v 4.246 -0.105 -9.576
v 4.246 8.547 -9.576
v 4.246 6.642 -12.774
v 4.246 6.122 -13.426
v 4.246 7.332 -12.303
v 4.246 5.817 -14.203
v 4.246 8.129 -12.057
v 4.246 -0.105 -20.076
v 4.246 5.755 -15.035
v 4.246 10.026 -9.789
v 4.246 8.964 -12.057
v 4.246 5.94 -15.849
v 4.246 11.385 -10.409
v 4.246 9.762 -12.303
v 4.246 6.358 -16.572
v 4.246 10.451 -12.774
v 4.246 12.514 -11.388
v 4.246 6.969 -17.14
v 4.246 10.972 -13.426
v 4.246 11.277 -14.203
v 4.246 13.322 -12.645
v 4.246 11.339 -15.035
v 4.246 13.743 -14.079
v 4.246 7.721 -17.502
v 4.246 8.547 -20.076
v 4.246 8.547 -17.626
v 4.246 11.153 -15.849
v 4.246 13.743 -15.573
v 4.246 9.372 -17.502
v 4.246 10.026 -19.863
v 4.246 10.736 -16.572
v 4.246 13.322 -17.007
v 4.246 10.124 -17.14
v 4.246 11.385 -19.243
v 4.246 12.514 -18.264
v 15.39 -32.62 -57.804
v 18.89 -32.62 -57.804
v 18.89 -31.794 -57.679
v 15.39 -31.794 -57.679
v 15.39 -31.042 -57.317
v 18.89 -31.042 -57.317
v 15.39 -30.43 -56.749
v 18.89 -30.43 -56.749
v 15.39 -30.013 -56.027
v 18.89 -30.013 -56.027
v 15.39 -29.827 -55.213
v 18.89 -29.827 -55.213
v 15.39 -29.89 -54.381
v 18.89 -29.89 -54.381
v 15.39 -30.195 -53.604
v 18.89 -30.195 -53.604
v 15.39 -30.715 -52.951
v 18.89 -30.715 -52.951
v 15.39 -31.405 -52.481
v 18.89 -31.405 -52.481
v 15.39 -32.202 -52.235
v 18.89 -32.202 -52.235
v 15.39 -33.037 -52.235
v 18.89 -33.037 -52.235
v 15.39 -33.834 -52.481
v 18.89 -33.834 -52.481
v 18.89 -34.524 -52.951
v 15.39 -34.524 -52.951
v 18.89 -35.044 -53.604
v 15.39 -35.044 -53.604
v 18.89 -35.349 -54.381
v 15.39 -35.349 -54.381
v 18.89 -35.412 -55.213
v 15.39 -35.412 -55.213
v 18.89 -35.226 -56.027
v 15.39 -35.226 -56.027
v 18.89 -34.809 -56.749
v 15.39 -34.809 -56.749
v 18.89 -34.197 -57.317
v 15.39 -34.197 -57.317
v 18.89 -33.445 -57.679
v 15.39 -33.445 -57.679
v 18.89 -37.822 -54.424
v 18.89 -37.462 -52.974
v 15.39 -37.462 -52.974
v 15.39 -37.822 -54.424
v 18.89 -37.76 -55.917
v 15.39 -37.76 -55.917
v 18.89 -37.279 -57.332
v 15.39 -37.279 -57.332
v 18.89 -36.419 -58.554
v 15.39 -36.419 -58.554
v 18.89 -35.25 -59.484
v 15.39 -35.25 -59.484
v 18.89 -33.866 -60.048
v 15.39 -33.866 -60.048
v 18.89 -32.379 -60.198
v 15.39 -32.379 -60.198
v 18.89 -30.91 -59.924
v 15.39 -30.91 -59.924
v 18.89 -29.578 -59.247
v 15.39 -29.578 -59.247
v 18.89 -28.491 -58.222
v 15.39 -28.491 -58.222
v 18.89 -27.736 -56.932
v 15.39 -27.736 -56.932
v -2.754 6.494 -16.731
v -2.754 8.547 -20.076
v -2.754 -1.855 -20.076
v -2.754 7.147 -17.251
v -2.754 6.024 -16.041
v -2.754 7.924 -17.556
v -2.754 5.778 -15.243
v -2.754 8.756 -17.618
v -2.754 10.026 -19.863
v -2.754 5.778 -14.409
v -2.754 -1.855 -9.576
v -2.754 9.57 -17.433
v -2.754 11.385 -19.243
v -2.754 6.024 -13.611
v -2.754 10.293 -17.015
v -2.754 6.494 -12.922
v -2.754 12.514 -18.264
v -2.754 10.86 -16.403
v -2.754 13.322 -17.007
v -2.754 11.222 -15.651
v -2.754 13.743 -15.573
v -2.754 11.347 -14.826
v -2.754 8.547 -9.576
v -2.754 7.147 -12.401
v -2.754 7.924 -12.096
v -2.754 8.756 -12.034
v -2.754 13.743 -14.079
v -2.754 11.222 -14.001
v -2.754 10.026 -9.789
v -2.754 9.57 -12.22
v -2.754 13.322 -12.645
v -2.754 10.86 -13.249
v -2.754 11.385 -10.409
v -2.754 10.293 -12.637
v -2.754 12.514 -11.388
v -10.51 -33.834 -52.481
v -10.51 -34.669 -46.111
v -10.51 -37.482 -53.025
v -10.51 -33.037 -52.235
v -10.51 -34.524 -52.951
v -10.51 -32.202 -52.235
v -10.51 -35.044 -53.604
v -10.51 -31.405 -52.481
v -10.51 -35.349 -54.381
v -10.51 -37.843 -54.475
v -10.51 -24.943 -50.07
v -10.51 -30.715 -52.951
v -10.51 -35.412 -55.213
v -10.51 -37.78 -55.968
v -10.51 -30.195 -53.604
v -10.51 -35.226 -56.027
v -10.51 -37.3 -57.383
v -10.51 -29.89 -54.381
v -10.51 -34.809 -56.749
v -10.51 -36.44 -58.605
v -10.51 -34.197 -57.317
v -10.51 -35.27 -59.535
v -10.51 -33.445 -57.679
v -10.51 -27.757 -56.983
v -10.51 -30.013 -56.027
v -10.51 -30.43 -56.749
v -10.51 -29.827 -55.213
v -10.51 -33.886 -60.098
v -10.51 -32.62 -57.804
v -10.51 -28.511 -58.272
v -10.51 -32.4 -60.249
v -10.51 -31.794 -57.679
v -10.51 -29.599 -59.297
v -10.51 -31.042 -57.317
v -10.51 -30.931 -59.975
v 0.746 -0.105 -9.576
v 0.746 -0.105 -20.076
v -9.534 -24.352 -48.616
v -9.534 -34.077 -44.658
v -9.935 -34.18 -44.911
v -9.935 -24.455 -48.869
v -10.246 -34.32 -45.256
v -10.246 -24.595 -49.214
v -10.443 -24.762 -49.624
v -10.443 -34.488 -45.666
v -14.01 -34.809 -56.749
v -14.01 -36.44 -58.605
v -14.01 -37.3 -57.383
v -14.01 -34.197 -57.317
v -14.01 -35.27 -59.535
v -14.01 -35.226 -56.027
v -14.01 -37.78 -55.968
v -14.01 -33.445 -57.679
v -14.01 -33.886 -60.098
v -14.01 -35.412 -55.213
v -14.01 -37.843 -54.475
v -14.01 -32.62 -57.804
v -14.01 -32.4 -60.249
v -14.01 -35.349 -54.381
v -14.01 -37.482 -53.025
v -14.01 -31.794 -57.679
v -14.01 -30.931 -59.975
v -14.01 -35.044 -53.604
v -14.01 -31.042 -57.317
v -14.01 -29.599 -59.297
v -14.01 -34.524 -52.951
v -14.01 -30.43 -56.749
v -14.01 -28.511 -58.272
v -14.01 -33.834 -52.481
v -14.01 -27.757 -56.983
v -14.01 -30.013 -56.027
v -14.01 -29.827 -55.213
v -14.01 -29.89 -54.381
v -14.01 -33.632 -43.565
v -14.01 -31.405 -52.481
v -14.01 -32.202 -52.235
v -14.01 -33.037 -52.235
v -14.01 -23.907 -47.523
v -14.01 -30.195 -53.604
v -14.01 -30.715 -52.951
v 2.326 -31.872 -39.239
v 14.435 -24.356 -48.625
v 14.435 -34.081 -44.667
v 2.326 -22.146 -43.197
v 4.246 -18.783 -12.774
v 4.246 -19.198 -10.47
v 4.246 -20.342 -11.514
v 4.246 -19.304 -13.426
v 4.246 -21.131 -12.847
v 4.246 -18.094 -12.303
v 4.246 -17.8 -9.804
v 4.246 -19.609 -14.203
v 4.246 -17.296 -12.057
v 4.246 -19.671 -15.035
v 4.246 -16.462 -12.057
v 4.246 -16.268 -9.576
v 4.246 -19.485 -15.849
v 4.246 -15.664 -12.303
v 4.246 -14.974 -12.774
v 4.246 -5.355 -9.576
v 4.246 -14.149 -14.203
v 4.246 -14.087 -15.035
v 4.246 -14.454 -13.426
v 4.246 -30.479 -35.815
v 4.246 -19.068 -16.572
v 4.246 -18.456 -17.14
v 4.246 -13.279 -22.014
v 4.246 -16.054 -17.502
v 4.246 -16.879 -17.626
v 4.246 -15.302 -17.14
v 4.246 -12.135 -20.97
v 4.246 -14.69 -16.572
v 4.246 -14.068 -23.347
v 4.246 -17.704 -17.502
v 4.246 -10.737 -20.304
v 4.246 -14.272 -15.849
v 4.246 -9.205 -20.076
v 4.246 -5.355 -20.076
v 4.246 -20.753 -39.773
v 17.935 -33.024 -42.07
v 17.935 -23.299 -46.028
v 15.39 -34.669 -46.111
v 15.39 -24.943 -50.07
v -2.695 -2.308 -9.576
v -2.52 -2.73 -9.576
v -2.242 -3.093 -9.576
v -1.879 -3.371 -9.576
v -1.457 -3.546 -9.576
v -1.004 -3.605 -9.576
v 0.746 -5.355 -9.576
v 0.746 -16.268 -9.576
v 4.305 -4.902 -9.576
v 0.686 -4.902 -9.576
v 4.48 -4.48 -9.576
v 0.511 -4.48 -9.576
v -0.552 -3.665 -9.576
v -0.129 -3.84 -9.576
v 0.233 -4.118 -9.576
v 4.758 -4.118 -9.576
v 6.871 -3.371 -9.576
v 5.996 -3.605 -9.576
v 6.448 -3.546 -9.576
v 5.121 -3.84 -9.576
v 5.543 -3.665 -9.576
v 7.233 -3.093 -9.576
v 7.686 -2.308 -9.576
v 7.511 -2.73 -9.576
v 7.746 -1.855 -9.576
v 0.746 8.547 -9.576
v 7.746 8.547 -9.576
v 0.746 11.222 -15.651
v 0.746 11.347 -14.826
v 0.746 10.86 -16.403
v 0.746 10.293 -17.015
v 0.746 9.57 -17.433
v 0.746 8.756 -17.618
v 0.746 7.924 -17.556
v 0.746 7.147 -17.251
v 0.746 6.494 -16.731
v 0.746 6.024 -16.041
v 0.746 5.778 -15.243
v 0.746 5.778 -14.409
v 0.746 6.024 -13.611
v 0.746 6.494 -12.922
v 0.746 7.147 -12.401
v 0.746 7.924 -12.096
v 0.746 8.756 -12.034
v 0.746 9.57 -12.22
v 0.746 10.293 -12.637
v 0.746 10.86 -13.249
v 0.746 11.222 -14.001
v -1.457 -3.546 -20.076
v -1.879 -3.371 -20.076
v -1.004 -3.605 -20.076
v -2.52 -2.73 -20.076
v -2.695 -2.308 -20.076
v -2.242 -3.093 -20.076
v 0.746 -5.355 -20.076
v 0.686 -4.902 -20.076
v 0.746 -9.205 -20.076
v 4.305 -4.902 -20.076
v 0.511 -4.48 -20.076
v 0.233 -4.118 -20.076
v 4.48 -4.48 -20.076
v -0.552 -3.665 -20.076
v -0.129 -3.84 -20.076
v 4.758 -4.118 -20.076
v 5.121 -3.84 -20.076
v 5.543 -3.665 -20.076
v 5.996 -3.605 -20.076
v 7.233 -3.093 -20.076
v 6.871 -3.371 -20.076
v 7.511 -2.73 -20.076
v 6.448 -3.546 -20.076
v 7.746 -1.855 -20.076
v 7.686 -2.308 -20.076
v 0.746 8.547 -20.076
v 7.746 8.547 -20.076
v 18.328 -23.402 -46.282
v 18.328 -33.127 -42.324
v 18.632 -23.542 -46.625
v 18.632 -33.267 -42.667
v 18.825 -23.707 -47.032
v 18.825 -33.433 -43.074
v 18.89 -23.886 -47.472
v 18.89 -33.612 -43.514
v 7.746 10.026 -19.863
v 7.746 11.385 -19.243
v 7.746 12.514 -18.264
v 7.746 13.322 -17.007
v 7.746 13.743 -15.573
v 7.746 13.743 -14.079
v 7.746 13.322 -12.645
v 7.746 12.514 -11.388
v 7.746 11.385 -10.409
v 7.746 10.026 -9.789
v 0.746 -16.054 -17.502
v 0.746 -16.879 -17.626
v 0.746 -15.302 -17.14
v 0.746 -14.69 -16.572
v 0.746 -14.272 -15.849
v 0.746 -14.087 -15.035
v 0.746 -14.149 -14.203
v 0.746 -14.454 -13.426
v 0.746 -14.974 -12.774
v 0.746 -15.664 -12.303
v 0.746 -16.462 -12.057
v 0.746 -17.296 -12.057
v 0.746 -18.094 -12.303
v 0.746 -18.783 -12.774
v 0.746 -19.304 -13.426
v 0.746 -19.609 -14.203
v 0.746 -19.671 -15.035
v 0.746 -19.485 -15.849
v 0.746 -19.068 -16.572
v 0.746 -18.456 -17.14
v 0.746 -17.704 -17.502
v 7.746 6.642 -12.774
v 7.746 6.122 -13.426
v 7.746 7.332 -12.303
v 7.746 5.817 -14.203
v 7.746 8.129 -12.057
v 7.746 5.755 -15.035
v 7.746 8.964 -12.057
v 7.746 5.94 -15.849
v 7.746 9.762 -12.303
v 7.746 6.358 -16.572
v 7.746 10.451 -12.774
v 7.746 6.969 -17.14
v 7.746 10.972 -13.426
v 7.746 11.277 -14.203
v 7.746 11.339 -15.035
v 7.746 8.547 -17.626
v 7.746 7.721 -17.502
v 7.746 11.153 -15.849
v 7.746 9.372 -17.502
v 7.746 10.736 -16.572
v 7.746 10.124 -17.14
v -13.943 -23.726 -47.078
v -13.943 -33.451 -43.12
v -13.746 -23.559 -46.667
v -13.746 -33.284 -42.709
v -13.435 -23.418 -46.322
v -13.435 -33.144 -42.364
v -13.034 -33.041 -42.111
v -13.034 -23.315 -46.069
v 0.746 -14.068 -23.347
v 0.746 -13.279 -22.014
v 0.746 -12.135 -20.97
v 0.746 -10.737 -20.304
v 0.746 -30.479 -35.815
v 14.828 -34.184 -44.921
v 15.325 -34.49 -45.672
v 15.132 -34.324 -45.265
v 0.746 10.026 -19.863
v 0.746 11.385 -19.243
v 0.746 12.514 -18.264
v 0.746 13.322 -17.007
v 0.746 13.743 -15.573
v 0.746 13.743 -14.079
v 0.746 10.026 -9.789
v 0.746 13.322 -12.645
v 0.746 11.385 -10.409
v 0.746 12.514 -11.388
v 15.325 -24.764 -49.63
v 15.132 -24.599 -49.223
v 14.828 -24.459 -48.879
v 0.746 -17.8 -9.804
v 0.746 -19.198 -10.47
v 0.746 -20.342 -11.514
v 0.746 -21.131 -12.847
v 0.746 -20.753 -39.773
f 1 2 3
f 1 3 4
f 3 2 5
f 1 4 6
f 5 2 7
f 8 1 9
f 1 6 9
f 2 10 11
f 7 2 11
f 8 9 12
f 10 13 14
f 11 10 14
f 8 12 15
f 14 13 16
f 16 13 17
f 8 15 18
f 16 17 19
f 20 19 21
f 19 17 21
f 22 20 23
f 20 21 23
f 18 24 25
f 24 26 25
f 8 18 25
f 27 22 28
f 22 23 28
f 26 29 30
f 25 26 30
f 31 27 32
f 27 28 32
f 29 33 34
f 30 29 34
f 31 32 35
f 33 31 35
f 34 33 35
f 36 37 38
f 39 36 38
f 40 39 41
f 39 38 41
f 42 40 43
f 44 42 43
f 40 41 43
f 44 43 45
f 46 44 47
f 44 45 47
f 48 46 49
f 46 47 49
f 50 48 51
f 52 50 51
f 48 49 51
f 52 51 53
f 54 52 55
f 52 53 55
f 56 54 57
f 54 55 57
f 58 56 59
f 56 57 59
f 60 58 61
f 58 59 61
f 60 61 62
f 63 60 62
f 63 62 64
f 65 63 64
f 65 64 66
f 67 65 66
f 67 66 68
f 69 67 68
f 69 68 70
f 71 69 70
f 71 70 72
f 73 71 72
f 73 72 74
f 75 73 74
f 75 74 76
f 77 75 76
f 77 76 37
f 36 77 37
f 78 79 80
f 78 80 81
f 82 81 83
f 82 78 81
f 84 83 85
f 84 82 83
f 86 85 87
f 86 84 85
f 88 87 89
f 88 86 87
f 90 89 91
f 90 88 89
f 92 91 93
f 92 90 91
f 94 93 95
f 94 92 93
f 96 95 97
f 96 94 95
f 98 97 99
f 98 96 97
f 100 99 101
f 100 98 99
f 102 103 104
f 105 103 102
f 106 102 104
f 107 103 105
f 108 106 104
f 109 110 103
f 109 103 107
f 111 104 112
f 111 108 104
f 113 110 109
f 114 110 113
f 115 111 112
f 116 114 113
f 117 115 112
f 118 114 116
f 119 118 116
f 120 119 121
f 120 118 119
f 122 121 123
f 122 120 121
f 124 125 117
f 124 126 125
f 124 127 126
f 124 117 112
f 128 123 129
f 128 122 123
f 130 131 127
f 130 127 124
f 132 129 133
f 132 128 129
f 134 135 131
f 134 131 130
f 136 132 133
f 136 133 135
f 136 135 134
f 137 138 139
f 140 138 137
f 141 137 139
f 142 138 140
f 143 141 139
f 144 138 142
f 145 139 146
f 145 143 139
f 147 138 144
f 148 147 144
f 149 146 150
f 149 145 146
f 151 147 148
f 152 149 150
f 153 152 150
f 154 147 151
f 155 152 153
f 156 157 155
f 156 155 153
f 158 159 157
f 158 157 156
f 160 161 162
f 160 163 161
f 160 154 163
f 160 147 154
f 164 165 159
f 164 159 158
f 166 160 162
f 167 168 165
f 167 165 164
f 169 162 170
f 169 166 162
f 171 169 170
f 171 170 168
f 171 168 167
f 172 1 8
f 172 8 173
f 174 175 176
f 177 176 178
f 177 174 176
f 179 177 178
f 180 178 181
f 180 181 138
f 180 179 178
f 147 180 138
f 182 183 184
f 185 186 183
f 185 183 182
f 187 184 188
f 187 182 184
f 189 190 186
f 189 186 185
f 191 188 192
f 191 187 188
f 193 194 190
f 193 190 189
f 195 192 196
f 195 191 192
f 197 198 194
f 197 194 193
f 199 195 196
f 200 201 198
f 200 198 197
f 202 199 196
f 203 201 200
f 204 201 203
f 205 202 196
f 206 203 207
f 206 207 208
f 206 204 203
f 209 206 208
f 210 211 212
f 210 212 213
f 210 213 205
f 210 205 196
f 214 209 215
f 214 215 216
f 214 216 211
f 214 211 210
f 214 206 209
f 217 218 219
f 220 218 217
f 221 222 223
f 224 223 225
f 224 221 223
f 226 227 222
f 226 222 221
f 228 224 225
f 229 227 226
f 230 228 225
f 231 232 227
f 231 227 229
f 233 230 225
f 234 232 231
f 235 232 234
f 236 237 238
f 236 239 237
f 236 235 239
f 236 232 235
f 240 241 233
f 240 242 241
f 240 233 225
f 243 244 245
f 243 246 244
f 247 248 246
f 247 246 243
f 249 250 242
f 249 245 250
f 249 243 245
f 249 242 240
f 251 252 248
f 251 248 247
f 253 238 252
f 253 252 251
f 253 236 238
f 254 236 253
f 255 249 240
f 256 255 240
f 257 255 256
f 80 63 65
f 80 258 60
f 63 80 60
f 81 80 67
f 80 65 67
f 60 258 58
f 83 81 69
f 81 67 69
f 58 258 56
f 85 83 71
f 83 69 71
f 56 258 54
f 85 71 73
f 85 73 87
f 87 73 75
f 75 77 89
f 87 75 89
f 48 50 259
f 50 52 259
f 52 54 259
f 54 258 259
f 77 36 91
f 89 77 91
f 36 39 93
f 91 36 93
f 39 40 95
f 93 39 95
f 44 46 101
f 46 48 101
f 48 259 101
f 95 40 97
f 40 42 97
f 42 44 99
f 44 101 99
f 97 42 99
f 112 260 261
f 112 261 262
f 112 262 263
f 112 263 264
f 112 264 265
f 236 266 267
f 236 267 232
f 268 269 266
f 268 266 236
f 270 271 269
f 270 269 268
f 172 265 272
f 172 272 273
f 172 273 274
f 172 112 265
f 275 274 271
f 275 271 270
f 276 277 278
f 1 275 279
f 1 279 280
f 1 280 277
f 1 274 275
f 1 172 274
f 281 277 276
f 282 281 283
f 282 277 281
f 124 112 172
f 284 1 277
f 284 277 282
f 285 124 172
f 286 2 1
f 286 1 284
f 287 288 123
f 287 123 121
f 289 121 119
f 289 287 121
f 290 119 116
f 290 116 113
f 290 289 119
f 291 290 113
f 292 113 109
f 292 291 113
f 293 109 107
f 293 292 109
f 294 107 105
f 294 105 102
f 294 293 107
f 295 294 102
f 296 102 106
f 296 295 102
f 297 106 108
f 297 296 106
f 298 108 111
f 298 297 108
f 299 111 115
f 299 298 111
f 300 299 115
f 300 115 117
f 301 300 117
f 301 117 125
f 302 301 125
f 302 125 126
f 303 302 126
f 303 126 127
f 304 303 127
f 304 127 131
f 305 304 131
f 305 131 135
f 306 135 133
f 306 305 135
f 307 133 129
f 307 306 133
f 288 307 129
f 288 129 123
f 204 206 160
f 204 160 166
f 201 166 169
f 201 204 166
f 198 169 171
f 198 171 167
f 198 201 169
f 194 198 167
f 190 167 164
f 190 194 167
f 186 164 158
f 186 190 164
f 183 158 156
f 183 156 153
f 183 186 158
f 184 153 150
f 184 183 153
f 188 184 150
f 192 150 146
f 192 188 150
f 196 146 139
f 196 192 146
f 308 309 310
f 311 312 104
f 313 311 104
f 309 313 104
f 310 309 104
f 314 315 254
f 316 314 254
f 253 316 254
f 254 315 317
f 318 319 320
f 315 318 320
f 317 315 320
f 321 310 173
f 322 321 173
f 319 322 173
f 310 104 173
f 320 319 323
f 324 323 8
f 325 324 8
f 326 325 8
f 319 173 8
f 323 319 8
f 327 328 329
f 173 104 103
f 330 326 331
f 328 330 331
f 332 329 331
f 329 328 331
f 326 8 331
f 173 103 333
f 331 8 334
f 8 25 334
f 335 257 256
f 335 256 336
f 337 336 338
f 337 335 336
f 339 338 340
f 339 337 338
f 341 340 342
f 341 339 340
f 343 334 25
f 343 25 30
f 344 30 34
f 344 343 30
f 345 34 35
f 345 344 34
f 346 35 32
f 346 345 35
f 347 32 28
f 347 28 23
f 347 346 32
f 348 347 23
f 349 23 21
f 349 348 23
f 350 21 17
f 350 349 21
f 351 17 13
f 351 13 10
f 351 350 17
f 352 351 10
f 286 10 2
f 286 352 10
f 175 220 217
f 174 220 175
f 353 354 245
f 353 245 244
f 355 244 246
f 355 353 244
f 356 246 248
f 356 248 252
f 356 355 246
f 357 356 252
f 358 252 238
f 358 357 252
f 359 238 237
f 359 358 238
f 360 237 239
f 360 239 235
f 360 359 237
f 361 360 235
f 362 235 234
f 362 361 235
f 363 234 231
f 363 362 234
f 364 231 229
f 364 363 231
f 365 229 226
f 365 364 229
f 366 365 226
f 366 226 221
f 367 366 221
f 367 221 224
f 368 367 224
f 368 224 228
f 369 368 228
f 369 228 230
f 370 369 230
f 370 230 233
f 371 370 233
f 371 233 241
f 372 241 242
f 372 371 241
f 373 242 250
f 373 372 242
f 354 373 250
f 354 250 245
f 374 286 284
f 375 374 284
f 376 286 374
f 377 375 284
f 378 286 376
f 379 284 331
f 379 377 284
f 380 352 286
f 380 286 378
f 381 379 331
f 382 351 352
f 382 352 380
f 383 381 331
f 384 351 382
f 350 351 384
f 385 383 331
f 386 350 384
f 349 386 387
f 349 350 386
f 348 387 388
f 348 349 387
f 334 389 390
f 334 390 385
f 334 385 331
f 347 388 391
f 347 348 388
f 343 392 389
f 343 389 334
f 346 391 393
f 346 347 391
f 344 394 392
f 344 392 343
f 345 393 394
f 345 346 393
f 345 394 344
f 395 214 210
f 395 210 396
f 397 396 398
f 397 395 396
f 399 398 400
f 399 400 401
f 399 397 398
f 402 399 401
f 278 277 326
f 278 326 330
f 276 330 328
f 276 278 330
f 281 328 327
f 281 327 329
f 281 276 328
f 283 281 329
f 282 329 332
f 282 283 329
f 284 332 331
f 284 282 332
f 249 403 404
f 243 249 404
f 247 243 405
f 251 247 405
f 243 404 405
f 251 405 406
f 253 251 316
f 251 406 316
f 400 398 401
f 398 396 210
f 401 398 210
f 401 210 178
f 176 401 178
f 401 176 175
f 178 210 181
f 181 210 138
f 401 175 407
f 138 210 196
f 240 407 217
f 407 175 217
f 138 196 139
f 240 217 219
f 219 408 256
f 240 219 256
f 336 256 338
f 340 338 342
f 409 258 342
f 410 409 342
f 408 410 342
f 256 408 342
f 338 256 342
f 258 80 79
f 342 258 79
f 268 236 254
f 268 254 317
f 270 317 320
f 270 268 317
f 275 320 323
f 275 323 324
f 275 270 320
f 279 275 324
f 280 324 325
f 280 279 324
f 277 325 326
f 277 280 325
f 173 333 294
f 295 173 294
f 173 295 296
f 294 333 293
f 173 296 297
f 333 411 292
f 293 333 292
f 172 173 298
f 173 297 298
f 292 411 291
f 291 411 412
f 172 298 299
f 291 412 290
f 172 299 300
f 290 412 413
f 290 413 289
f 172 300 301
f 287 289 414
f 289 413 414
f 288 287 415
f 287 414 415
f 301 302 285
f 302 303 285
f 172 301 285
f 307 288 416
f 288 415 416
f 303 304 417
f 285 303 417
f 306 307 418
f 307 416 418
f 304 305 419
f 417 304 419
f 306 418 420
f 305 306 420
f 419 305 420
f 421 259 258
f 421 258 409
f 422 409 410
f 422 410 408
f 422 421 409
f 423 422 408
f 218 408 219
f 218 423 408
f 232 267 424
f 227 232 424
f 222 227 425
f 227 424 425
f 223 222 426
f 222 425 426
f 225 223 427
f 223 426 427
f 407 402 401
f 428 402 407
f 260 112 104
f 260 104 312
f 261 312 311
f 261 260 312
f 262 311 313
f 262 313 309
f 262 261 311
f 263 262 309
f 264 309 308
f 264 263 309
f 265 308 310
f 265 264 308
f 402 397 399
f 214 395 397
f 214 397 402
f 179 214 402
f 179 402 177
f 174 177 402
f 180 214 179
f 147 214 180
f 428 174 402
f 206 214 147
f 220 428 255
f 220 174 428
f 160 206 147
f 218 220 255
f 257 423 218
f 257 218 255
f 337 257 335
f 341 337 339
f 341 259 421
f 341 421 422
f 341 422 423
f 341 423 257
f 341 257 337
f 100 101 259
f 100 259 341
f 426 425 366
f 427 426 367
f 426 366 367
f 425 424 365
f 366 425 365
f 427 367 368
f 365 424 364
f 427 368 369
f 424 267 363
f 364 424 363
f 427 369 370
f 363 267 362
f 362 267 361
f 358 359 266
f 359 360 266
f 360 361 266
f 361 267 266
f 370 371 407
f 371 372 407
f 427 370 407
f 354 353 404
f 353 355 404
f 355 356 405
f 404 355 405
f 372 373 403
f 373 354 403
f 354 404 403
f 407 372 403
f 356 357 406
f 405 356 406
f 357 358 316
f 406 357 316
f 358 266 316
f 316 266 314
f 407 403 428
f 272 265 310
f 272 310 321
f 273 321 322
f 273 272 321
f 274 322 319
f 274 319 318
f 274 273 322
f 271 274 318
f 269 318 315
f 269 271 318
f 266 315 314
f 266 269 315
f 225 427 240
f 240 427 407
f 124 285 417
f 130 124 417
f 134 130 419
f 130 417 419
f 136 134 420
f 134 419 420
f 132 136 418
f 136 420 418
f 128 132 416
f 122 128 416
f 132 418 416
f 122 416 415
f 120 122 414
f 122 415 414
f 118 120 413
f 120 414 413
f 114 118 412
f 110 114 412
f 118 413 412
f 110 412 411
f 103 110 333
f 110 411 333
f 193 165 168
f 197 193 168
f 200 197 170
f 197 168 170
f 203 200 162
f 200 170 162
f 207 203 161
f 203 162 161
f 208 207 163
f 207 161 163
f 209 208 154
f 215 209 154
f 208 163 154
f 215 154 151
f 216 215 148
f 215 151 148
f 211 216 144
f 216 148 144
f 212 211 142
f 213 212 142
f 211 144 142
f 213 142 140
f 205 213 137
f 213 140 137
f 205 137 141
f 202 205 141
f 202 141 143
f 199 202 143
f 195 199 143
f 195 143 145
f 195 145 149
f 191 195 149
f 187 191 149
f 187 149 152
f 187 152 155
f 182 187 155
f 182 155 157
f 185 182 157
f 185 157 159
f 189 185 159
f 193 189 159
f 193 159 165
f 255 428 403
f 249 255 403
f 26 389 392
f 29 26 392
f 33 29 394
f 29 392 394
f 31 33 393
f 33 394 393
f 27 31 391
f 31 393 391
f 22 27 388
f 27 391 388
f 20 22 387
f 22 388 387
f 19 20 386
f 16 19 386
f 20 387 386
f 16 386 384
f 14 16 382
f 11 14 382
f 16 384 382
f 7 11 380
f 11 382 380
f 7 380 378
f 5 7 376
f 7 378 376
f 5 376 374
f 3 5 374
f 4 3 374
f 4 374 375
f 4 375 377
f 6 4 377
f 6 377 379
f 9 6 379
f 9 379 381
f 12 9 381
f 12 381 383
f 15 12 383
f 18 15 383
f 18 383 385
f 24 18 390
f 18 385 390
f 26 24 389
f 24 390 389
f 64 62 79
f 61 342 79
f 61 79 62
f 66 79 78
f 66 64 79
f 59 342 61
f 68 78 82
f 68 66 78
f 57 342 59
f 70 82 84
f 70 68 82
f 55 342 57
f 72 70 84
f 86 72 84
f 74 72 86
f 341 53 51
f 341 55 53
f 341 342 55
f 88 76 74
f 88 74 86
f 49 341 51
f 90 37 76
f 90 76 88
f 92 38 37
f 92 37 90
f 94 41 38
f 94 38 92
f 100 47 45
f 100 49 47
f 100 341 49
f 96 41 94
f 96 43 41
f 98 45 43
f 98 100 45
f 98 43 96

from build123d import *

# Parameters (mm, degrees)
SKETCH1_R           = 4
BOSS_EXTRUDE1_DEPTH = 5
BOSS_EXTRUDE2_DEPTH = 15
SKETCH3_R           = 7.5
SKETCH3_R_2         = 4
BOSS_EXTRUDE3_DEPTH = 5
SKETCH5_R           = 4
CUT_EXTRUDE1_DEPTH  = 5
BOSS_EXTRUDE4_START = -5
SKETCH6_R           = 7.5
BOSS_EXTRUDE4_DEPTH = 5
CUT_EXTRUDE2_START  = -5
SKETCH7_R           = 4
CUT_EXTRUDE2_DEPTH  = 5
BOSS_EXTRUDE5_DEPTH = 15
SKETCH9_R           = 7.5
BOSS_EXTRUDE6_DEPTH = 5
SKETCH10_R          = 7.5
BOSS_EXTRUDE7_DEPTH = 5
SKETCH11_R          = 4
CUT_EXTRUDE3_DEPTH  = 64
SCALE1_SCALE        = 0.7


with BuildPart() as part:
    # Sketch1 → Boss-Extrude1 (new body)
    with BuildSketch(Plane(origin=(0, 0, 0), x_dir=(0, 0, -1), z_dir=(1, 0, 0))):
        with BuildLine():
            Line((15, 0), (0, 0))
            Line((0, 0), (0, -15.59))
            ThreePointArc((0, -15.59), (1.276909506, -19.776065539), (4.672838586, -22.536737244))
            Line((4.672838586, -22.536737244), (37.484806943, -35.890449582))
            Line((37.484806943, -35.890449582), (43.13912977, -21.996975093))
            Line((43.13912977, -21.996975093), (19.672838586, -12.446737244))
            ThreePointArc((19.672838586, -12.446737244), (16.276909506, -9.686065539), (15, -5.5))
            Line((15, -5.5), (15, 0))
        make_face()
        with Locations((7.5, -16.462434129)):
            Circle(SKETCH1_R, mode=Mode.SUBTRACT)
    extrude(amount=BOSS_EXTRUDE1_DEPTH)

    # Sketch2 → Boss-Extrude2 (add)
    with BuildSketch(Plane.XY):
        with BuildLine():
            Line((0, 0), (5, 0))
            ThreePointArc((5, 0), (5.732233047, 1.767766953), (7.5, 2.5))
            ThreePointArc((7.5, 2.5), (9.267766953, 3.232233047), (10, 5))
            Line((10, 5), (10, 19.86))
            Line((10, 19.86), (5, 19.86))
            Line((5, 19.86), (5, 7.5))
            Line((5, 7.5), (0, 7.5))
            Line((0, 7.5), (0, 19.86))
            Line((0, 19.86), (-5, 19.86))
            Line((-5, 19.86), (-5, 5))
            ThreePointArc((-5, 5), (-4.267766953, 3.232233047), (-2.5, 2.5))
            ThreePointArc((-2.5, 2.5), (-0.732233047, 1.767766953), (0, 0))
        make_face()
    extrude(amount=-BOSS_EXTRUDE2_DEPTH)

    # Sketch3 → Boss-Extrude3 (add)
    with BuildSketch(Plane(origin=(10, 0, 0), x_dir=(0, 0, -1), z_dir=(1, 0, 0))):
        with Locations((7.5, 19.86)):
            Circle(SKETCH3_R)
        with Locations((7.5, 19.86)):
            Circle(SKETCH3_R_2, mode=Mode.SUBTRACT)
    extrude(amount=-BOSS_EXTRUDE3_DEPTH)

    # Sketch5 → Cut-Extrude1 (cut)
    with BuildSketch(Plane(origin=(10, 0, 0), x_dir=(0, 0, -1), z_dir=(1, 0, 0))):
        with Locations(Location((7.5, 19.86, 0), (0, 0, 90))):
            Circle(SKETCH5_R)
    extrude(amount=-CUT_EXTRUDE1_DEPTH, mode=Mode.SUBTRACT)

    # Sketch6 → Boss-Extrude4 (add)
    with BuildSketch(Plane.ZY.offset(5).offset(BOSS_EXTRUDE4_START)):
        with Locations((-7.5, 19.86)):
            Circle(SKETCH6_R)
    extrude(amount=BOSS_EXTRUDE4_DEPTH)

    # Sketch7 → Cut-Extrude2 (cut)
    with BuildSketch(Plane.ZY.offset(5).offset(CUT_EXTRUDE2_START)):
        with Locations(Location((-7.5, 19.86, 0), (0, 0, 90))):
            Circle(SKETCH7_R)
    extrude(amount=CUT_EXTRUDE2_DEPTH, mode=Mode.SUBTRACT)

    # Sketch8 → Boss-Extrude5 (add)
    with BuildSketch(Plane(origin=(0, -3.809395954, 1.55033606), x_dir=(1, 0, 0), z_dir=(0, 0.926231632569695, -0.376954855158118))):
        with BuildLine():
            Line((0, 48.248693155), (5, 48.248693155))
            Line((5, 48.248693155), (24.55634321, 57.895622609))
            ThreePointArc((24.55634321, 57.895622609), (25.552769913, 58.816883816), (25.92108759, 60.122996551))
            Line((25.92108759, 60.122996551), (25.92108759, 74.712996551))
            Line((25.92108759, 74.712996551), (20.92108759, 74.712996551))
            Line((20.92108759, 74.712996551), (20.92108759, 64.128787942))
            ThreePointArc((20.92108759, 64.128787942), (20.552769913, 62.822675208), (19.55634321, 61.901414001))
            Line((19.55634321, 61.901414001), (2.258260879, 53.528693155))
            Line((2.258260879, 53.528693155), (-14.685235236, 61.886733815))
            ThreePointArc((-14.685235236, 61.886733815), (-15.702336235, 62.808740922), (-16.079254544, 64.128787942))
            Line((-16.079254544, 64.128787942), (-16.079254544, 74.791257758))
            Line((-16.079254544, 74.791257758), (-21.079254544, 74.791257758))
            Line((-21.079254544, 74.791257758), (-21.079254544, 60.201257758))
            ThreePointArc((-21.079254544, 60.201257758), (-20.702336235, 58.881210738), (-19.685235236, 57.95920363))
            Line((-19.685235236, 57.95920363), (0, 48.248693155))
        make_face()
    extrude(amount=-BOSS_EXTRUDE5_DEPTH)

    # Sketch9 → Boss-Extrude6 (add)
    with BuildSketch(Plane(origin=(25.92108759, 0, 0), x_dir=(0, 0, -1), z_dir=(1, 0, 0))):
        with Locations((64.824043295, -38.919559991)):
            Circle(SKETCH9_R)
    extrude(amount=-BOSS_EXTRUDE6_DEPTH)

    # Sketch10 → Boss-Extrude7 (add)
    with BuildSketch(Plane.ZY.offset(21.079254544)):
        with Locations((-64.896531301, -38.949060933)):
            Circle(SKETCH10_R)
    extrude(amount=-BOSS_EXTRUDE7_DEPTH)

    # Sketch11 → Cut-Extrude3 (cut)
    with BuildSketch(Plane(origin=(25.92108759, 0, 0), x_dir=(0, 0, -1), z_dir=(1, 0, 0))):
        with Locations((64.896531301, -38.949060933)):
            Circle(SKETCH11_R)
    extrude(amount=-CUT_EXTRUDE3_DEPTH, mode=Mode.SUBTRACT)


with BuildPart() as part_1:
    # Scale1: scaled about (2.485117757, -17.850767572, -31.920196675)
    add(part.part.scale(SCALE1_SCALE).moved(Location((0.745535327, -5.355230272, -9.576059003))))


solid = part_1.part
